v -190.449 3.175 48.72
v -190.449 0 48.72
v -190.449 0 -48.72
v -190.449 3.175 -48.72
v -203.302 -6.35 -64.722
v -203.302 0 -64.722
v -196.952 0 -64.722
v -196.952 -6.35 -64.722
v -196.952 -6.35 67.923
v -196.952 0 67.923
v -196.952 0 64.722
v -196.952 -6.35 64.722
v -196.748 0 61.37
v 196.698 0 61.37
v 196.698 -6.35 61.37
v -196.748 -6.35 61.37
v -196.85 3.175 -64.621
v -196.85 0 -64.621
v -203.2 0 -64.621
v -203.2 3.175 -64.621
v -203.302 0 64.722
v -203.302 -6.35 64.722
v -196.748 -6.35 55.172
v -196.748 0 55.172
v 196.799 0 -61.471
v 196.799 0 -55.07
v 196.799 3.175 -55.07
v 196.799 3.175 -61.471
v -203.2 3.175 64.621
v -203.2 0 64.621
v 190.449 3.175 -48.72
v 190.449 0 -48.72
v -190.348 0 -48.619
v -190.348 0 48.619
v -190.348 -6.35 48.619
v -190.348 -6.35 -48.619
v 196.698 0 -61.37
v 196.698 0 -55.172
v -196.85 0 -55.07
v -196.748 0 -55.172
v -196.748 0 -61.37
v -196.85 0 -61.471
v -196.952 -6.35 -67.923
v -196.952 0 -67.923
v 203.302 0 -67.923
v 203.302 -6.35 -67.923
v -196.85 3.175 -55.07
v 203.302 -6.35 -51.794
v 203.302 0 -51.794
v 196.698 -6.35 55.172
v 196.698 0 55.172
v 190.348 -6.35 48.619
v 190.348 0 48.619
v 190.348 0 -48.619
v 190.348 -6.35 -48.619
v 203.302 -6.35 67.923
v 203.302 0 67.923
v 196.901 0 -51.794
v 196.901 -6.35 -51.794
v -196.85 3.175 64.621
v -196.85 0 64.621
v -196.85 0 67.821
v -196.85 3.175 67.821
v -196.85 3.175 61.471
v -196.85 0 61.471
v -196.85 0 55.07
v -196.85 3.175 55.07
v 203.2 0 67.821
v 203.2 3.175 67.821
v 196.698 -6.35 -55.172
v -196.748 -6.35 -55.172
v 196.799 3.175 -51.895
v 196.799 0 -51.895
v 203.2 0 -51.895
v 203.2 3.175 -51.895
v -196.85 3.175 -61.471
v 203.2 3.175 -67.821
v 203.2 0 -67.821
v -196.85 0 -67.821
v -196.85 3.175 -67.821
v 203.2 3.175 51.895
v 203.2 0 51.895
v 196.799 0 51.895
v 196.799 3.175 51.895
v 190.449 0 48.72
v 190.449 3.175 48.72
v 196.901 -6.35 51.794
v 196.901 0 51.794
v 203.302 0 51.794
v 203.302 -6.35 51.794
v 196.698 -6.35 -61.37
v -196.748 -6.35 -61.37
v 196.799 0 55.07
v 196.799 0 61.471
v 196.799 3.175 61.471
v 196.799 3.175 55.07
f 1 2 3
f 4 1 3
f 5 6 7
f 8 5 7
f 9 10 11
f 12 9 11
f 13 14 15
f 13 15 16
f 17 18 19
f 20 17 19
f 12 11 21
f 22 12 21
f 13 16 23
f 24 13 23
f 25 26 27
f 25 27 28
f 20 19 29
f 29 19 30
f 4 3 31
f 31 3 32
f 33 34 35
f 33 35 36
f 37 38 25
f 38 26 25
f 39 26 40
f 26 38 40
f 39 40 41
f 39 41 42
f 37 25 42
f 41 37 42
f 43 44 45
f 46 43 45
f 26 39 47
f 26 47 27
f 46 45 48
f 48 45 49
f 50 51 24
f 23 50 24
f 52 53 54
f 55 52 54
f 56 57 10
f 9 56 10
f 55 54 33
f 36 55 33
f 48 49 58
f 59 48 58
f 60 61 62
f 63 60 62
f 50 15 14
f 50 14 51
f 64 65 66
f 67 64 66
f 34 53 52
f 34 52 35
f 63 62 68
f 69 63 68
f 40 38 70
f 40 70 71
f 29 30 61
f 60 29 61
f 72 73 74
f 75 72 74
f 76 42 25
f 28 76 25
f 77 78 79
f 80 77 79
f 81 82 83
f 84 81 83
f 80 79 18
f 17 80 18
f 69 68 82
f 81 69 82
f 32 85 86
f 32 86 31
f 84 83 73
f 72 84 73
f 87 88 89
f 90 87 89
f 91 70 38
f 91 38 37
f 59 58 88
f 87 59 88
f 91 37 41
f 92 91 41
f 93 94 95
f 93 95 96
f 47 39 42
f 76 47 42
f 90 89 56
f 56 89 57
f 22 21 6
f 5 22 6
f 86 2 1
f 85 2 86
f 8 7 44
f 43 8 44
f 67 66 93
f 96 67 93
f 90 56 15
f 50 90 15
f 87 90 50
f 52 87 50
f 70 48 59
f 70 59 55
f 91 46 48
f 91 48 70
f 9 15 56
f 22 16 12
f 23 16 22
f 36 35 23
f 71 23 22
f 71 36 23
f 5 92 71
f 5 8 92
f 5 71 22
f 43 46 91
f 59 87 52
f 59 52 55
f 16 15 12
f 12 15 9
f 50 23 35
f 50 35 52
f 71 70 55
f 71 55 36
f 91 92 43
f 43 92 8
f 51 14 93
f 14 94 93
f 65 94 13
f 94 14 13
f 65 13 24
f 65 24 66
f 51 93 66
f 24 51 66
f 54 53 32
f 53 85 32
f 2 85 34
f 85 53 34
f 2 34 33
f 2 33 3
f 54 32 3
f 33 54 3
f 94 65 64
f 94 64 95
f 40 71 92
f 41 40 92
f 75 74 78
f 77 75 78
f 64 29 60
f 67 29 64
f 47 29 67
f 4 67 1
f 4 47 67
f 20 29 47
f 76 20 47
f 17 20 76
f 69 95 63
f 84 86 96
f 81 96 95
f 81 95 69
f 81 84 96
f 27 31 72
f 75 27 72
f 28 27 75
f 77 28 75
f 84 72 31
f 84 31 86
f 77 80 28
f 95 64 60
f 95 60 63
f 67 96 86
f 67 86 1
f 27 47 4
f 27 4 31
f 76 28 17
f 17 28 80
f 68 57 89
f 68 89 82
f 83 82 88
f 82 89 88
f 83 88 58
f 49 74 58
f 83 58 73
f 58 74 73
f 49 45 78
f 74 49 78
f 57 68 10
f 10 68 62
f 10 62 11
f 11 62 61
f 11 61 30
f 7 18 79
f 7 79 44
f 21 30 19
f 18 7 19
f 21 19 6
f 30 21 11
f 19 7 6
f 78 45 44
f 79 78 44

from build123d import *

# Parameters (mm, degrees)
SKETCH1_W           = 393.6492
SKETCH1_H           = 6.4008
SKETCH1_W_2         = 380.8984
SKETCH1_H_2         = 97.44075
BOSS_EXTRUDE1_DEPTH = 3.175
SKETCH5_W           = 393.446
SKETCH5_H           = 6.1976
SKETCH5_W_2         = 380.6952
SKETCH5_H_2         = 97.23755
BOSS_EXTRUDE4_DEPTH = 6.35


with BuildPart() as part:
    # Sketch1 → Boss-Extrude1 (new body)
    with BuildSketch(Plane(origin=(0, 0, 0), x_dir=(1, 0, 0), z_dir=(0, 1, 0))):
        Polygon((-203.2, 64.620775), (-203.2, -64.620775), (-196.85, -64.620775), (-196.85, -67.821175), (203.2, -67.821175), (203.2, -51.895375), (196.7992, -51.895375), (196.7992, 51.895375), (203.2, 51.895375), (203.2, 67.821175), (-196.85, 67.821175), (-196.85, 64.620775), align=None)
        with Locations((-0.0254, 58.270775)):
            Rectangle(SKETCH1_W, SKETCH1_H, mode=Mode.SUBTRACT)
        with Locations((-0.0254, -58.270775)):
            Rectangle(SKETCH1_W, SKETCH1_H, mode=Mode.SUBTRACT)
        Rectangle(SKETCH1_W_2, SKETCH1_H_2, mode=Mode.SUBTRACT)
    extrude(amount=BOSS_EXTRUDE1_DEPTH)

    # Sketch5 → Boss-Extrude4 (add)
    with BuildSketch(Plane(origin=(0, 0, 0), x_dir=(-1, 0, 0), z_dir=(0, -1, 0))):
        Polygon((-203.3016, -51.793775), (-203.3016, -67.922775), (196.9516, -67.922775), (196.9516, -64.722375), (203.3016, -64.722375), (203.3016, 64.722375), (196.9516, 64.722375), (196.9516, 67.922775), (-203.3016, 67.922775), (-203.3016, 51.793775), (-196.9008, 51.793775), (-196.9008, -51.793775), align=None)
        with Locations((0.0254, 58.270775)):
            Rectangle(SKETCH5_W, SKETCH5_H, mode=Mode.SUBTRACT)
        Rectangle(SKETCH5_W_2, SKETCH5_H_2, mode=Mode.SUBTRACT)
        with Locations((0.0254, -58.270775)):
            Rectangle(SKETCH5_W, SKETCH5_H, mode=Mode.SUBTRACT)
    extrude(amount=BOSS_EXTRUDE4_DEPTH)


solid = part.part
